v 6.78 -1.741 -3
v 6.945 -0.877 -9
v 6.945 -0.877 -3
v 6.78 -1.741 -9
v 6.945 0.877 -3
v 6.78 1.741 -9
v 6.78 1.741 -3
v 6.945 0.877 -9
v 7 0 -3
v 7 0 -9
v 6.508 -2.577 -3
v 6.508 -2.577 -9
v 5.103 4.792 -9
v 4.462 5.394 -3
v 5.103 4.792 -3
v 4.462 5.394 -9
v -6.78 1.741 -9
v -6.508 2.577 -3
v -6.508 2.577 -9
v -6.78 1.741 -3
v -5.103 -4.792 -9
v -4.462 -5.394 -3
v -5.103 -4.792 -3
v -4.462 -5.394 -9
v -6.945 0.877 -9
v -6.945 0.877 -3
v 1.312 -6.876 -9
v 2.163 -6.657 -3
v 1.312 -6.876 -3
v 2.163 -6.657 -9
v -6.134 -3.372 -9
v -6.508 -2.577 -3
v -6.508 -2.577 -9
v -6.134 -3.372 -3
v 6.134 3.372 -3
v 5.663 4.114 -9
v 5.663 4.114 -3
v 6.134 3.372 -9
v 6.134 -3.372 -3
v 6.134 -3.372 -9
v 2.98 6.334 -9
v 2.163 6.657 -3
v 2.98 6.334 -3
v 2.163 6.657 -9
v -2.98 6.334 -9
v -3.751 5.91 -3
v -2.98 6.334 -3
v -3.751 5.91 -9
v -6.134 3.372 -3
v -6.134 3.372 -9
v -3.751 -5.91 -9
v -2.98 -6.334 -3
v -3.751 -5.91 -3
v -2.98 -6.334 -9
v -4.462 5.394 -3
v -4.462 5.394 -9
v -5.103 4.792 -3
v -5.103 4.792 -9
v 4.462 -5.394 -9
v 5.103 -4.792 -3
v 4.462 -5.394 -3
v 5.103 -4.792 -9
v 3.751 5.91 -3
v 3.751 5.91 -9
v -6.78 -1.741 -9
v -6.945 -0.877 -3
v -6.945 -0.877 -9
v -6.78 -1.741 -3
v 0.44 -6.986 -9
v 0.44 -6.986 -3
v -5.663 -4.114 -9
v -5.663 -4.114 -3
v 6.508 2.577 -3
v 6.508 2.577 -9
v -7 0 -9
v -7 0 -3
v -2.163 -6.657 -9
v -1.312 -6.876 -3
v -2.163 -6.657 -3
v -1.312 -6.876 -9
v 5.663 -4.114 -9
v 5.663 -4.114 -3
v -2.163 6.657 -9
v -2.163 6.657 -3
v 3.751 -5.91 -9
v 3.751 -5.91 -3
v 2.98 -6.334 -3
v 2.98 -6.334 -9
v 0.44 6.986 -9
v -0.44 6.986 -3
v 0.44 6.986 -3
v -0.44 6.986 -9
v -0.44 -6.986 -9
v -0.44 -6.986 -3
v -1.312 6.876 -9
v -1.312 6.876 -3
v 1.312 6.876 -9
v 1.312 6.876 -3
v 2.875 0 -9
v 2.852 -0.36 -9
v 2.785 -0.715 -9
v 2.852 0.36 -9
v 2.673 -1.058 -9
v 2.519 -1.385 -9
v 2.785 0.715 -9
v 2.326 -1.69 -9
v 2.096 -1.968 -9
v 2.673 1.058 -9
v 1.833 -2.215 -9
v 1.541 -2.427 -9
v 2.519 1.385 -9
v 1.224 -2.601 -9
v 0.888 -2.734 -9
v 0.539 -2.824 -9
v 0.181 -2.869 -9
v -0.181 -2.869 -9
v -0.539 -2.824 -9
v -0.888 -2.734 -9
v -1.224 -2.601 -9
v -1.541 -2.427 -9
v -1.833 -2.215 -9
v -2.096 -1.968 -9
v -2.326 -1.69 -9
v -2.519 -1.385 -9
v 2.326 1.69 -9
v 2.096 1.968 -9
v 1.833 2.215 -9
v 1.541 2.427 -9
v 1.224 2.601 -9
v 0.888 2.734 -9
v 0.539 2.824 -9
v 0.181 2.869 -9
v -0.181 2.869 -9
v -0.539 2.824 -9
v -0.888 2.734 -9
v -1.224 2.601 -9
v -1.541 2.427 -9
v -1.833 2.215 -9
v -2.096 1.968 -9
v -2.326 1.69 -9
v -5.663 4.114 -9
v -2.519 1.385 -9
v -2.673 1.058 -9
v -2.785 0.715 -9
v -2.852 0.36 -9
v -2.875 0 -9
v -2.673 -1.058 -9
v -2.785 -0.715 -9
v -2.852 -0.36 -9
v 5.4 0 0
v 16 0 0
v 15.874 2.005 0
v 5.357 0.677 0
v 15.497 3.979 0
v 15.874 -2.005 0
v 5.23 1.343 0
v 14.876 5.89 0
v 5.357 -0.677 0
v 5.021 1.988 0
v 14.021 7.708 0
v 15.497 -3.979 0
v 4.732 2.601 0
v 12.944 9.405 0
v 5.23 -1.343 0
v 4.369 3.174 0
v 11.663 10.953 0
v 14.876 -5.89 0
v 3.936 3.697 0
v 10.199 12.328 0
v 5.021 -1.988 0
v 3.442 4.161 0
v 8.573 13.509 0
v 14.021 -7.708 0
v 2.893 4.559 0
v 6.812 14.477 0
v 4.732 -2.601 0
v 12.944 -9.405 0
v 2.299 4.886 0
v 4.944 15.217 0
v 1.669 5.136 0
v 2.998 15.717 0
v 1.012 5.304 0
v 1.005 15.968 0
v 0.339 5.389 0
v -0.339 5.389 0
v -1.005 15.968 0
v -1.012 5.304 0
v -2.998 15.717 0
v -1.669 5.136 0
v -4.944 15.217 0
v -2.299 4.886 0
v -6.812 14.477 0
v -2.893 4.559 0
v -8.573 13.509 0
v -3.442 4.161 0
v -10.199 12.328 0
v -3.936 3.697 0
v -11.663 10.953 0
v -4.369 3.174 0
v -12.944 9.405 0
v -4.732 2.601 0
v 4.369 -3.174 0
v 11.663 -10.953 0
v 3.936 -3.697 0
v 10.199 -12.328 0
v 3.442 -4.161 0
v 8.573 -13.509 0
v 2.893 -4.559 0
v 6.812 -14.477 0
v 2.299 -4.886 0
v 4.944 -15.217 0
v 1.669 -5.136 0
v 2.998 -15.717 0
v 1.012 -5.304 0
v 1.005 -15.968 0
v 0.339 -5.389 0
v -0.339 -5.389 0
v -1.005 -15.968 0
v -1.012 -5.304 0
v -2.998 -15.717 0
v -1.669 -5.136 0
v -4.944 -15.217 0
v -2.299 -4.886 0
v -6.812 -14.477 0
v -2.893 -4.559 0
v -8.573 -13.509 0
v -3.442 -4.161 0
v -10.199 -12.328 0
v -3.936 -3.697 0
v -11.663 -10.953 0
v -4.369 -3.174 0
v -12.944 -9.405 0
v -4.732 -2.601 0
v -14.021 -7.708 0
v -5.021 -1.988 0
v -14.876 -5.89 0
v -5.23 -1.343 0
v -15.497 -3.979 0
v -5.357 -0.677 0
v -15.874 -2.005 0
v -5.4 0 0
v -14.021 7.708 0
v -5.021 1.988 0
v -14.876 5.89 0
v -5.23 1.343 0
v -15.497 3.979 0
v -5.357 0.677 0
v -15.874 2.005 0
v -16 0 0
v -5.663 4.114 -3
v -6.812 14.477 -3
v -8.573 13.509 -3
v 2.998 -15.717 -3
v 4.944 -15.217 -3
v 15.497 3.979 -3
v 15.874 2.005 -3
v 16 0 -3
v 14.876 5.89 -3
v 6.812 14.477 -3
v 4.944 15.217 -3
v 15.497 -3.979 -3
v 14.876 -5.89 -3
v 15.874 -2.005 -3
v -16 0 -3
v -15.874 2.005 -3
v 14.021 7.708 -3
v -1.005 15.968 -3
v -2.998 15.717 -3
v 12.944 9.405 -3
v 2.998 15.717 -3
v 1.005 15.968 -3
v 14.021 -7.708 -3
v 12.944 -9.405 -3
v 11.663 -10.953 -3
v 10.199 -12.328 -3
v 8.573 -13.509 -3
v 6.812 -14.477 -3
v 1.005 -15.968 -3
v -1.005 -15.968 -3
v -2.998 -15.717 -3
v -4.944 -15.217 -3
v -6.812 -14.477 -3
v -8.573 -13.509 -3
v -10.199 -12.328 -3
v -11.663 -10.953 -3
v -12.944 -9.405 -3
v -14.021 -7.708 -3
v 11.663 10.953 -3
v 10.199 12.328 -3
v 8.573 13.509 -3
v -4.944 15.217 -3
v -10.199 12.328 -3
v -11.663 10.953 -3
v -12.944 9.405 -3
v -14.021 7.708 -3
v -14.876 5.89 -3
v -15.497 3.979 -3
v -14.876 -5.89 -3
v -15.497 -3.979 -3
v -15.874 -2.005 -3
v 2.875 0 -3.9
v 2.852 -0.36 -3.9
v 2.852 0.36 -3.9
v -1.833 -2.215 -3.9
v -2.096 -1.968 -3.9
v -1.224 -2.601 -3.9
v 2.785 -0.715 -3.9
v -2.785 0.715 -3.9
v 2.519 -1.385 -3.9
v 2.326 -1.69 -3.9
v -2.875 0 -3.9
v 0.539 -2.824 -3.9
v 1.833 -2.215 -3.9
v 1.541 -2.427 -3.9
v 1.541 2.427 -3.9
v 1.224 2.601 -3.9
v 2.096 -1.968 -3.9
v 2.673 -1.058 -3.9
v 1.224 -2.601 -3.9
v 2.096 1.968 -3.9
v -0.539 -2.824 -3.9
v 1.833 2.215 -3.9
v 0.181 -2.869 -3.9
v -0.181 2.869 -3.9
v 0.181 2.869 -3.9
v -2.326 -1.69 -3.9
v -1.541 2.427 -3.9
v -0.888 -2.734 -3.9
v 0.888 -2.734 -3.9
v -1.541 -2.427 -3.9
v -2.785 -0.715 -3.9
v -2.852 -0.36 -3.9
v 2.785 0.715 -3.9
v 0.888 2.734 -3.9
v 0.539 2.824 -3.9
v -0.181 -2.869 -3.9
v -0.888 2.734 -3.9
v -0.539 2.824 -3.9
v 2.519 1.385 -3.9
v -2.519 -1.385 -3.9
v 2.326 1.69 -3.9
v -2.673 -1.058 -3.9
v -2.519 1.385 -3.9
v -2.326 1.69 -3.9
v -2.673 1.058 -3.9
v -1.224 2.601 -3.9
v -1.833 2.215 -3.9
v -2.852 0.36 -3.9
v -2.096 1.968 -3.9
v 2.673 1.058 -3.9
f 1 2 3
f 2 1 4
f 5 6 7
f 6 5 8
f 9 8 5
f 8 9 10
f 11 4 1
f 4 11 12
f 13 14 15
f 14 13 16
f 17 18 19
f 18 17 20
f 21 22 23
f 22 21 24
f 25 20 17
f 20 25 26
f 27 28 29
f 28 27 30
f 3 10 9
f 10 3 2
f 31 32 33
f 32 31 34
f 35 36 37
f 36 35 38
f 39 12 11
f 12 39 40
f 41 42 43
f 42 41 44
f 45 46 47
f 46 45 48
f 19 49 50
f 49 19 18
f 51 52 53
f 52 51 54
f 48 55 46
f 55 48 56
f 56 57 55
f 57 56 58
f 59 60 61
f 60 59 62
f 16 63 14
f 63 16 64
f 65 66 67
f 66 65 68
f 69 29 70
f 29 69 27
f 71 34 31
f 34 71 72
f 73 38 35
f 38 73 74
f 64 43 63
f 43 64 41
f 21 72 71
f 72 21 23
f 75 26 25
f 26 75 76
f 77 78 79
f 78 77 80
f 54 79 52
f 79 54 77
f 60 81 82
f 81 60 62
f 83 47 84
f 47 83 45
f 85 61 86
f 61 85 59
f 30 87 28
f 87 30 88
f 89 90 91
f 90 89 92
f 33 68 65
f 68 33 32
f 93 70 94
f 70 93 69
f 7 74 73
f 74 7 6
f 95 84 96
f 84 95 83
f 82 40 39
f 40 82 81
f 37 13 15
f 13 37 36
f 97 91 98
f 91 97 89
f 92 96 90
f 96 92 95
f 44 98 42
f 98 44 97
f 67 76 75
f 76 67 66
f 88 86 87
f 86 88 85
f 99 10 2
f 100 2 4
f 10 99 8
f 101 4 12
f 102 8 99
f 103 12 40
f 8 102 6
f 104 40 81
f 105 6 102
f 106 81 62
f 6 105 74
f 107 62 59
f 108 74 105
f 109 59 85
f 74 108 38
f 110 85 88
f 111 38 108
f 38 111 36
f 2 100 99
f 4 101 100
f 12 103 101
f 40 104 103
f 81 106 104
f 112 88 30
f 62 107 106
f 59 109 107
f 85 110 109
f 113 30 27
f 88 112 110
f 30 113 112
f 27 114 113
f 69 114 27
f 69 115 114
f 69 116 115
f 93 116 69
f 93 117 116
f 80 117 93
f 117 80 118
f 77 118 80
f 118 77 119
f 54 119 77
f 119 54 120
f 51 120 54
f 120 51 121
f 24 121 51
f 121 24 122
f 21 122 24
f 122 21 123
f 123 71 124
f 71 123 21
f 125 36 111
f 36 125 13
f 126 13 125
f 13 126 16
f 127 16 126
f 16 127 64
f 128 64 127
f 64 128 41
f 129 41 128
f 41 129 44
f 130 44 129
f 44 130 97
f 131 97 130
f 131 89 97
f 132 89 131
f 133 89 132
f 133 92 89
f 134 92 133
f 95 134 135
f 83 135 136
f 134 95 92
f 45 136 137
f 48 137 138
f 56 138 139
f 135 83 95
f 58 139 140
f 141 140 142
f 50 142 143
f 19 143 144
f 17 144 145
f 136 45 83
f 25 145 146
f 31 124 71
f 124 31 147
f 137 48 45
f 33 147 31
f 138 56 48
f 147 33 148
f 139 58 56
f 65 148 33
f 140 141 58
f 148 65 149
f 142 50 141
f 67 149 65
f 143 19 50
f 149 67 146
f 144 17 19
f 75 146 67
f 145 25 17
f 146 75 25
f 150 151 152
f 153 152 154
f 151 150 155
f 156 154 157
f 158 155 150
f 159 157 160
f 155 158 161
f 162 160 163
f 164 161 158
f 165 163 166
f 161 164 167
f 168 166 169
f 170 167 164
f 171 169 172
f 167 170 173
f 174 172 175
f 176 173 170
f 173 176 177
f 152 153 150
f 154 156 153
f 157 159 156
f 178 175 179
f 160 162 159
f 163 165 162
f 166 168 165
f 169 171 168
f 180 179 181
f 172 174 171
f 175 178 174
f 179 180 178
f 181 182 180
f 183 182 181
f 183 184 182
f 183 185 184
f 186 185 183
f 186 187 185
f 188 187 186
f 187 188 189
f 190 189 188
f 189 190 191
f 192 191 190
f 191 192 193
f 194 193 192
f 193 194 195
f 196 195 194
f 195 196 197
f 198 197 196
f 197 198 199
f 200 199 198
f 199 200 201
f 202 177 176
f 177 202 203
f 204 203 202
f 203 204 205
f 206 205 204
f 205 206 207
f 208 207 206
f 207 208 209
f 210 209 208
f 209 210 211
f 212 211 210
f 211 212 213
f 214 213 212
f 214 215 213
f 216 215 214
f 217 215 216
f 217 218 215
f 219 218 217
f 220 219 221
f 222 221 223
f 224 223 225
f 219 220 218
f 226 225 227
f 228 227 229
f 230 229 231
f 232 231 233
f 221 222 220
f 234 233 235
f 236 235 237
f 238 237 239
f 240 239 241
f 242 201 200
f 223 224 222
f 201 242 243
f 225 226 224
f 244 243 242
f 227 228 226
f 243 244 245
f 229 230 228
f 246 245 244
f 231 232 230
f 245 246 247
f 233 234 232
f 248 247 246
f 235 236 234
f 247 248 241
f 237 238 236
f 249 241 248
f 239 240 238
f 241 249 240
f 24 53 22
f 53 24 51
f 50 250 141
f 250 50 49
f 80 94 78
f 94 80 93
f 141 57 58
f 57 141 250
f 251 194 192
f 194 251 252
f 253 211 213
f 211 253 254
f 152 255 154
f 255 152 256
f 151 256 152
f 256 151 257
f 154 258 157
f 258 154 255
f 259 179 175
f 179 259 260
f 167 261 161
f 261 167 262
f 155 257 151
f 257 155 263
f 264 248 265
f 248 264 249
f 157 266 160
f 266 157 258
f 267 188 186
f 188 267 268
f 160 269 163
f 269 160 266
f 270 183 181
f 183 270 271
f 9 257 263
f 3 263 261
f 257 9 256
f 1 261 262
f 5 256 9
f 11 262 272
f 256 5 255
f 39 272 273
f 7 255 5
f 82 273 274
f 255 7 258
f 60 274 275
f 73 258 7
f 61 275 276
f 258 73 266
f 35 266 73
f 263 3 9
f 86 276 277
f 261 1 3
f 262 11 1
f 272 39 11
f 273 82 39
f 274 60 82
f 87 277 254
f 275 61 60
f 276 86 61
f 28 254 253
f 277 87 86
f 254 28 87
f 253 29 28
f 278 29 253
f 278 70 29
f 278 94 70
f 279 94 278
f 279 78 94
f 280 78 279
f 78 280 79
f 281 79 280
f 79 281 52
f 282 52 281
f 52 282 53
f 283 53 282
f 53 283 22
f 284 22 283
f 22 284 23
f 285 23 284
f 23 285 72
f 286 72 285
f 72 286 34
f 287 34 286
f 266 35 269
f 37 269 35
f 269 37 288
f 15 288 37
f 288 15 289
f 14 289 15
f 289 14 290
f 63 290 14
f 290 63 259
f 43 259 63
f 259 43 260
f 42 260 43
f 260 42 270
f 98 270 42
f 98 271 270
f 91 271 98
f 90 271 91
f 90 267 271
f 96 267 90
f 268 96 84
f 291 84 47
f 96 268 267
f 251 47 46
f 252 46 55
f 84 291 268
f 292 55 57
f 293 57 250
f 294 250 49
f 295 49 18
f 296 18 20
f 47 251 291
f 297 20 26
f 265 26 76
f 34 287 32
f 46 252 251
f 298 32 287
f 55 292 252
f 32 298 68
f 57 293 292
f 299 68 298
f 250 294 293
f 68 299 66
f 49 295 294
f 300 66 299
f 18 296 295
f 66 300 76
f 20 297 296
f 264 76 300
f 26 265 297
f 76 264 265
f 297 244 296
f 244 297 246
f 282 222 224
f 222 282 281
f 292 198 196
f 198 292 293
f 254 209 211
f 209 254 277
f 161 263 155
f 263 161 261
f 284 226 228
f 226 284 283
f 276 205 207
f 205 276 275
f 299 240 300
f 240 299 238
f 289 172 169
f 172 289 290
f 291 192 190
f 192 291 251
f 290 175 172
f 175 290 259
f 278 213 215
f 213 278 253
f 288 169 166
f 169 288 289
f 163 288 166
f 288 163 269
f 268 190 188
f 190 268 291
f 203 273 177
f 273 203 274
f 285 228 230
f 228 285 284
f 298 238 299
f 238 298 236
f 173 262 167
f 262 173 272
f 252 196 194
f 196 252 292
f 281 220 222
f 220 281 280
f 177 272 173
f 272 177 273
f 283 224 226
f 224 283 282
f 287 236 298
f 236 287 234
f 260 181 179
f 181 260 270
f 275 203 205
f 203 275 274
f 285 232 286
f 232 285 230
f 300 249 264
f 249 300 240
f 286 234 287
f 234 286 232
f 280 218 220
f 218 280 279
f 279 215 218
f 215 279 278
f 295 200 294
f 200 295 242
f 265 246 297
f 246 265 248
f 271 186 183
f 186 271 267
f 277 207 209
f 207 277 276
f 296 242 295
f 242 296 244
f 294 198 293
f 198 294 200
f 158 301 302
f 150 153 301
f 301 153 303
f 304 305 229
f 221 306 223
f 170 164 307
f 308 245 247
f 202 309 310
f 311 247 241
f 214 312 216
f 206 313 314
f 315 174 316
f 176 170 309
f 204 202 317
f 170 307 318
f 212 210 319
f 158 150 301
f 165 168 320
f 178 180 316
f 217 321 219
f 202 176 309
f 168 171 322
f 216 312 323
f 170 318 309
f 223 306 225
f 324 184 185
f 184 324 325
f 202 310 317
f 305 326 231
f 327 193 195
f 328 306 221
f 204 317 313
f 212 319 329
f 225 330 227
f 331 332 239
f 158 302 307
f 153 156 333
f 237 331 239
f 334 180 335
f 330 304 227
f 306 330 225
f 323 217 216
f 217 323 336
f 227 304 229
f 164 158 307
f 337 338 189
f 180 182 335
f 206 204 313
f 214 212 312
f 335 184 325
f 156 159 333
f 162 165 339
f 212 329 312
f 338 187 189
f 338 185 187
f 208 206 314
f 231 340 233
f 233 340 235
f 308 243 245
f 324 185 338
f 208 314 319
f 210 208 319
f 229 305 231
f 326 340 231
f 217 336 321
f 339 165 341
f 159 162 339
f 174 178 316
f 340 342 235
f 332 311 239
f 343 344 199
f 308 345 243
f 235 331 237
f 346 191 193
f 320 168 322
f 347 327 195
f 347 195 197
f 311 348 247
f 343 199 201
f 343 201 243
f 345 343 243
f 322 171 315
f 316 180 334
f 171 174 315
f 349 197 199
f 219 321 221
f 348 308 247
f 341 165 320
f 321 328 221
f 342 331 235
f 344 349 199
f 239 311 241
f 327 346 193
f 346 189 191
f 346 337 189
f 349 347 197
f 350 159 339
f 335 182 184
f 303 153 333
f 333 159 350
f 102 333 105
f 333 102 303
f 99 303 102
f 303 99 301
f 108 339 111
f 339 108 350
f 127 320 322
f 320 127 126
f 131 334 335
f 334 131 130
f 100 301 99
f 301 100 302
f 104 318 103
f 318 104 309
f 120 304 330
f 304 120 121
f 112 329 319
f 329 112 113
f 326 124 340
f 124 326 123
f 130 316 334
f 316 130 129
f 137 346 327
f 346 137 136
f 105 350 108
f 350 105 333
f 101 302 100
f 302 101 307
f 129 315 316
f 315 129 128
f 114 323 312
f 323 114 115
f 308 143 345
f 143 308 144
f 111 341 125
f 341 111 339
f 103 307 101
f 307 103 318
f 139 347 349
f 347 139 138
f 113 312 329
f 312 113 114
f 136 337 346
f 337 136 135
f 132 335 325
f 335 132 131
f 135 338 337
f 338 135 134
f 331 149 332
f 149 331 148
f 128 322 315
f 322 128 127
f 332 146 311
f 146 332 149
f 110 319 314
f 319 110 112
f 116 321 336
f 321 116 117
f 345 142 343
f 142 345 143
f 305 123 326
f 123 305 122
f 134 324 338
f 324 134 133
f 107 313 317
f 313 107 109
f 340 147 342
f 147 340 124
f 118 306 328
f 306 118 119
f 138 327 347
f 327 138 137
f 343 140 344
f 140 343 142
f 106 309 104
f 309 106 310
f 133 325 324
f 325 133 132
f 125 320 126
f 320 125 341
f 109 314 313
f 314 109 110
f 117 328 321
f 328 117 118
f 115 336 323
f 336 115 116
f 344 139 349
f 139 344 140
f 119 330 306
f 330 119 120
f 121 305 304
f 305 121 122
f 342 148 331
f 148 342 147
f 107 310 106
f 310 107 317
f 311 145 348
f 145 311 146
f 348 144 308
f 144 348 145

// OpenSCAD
$fn = 50;


difference() {
	union() {
		translate(v = [0, 0, -9.0000000000]) {
			cylinder(h = 9, r = 7.0000000000);
		}
		translate(v = [0, 0, -3.0000000000]) {
			cylinder(h = 3, r = 16.0000000000);
		}
	}
	union() {
		translate(v = [0, 0, 0]) {
			rotate(a = [0, 0, 0]) {
				difference() {
					union() {
						#translate(v = [0, 0, -9.0000000000]) {
							cylinder(h = 9, r = 2.6000000000);
						}
						#translate(v = [0, 0, -3.9000000000]) {
							cylinder(h = 3.9000000000, r = 7.0000000000, r1 = 2.8750000000, r2 = 5.4000000000);
						}
						#translate(v = [0, 0, -9.0000000000]) {
							cylinder(h = 9, r = 2.8750000000);
						}
						#translate(v = [0, 0, -9.0000000000]) {
							cylinder(h = 9, r = 2.6000000000);
						}
					}
					union();
				}
			}
		}
	}
}
